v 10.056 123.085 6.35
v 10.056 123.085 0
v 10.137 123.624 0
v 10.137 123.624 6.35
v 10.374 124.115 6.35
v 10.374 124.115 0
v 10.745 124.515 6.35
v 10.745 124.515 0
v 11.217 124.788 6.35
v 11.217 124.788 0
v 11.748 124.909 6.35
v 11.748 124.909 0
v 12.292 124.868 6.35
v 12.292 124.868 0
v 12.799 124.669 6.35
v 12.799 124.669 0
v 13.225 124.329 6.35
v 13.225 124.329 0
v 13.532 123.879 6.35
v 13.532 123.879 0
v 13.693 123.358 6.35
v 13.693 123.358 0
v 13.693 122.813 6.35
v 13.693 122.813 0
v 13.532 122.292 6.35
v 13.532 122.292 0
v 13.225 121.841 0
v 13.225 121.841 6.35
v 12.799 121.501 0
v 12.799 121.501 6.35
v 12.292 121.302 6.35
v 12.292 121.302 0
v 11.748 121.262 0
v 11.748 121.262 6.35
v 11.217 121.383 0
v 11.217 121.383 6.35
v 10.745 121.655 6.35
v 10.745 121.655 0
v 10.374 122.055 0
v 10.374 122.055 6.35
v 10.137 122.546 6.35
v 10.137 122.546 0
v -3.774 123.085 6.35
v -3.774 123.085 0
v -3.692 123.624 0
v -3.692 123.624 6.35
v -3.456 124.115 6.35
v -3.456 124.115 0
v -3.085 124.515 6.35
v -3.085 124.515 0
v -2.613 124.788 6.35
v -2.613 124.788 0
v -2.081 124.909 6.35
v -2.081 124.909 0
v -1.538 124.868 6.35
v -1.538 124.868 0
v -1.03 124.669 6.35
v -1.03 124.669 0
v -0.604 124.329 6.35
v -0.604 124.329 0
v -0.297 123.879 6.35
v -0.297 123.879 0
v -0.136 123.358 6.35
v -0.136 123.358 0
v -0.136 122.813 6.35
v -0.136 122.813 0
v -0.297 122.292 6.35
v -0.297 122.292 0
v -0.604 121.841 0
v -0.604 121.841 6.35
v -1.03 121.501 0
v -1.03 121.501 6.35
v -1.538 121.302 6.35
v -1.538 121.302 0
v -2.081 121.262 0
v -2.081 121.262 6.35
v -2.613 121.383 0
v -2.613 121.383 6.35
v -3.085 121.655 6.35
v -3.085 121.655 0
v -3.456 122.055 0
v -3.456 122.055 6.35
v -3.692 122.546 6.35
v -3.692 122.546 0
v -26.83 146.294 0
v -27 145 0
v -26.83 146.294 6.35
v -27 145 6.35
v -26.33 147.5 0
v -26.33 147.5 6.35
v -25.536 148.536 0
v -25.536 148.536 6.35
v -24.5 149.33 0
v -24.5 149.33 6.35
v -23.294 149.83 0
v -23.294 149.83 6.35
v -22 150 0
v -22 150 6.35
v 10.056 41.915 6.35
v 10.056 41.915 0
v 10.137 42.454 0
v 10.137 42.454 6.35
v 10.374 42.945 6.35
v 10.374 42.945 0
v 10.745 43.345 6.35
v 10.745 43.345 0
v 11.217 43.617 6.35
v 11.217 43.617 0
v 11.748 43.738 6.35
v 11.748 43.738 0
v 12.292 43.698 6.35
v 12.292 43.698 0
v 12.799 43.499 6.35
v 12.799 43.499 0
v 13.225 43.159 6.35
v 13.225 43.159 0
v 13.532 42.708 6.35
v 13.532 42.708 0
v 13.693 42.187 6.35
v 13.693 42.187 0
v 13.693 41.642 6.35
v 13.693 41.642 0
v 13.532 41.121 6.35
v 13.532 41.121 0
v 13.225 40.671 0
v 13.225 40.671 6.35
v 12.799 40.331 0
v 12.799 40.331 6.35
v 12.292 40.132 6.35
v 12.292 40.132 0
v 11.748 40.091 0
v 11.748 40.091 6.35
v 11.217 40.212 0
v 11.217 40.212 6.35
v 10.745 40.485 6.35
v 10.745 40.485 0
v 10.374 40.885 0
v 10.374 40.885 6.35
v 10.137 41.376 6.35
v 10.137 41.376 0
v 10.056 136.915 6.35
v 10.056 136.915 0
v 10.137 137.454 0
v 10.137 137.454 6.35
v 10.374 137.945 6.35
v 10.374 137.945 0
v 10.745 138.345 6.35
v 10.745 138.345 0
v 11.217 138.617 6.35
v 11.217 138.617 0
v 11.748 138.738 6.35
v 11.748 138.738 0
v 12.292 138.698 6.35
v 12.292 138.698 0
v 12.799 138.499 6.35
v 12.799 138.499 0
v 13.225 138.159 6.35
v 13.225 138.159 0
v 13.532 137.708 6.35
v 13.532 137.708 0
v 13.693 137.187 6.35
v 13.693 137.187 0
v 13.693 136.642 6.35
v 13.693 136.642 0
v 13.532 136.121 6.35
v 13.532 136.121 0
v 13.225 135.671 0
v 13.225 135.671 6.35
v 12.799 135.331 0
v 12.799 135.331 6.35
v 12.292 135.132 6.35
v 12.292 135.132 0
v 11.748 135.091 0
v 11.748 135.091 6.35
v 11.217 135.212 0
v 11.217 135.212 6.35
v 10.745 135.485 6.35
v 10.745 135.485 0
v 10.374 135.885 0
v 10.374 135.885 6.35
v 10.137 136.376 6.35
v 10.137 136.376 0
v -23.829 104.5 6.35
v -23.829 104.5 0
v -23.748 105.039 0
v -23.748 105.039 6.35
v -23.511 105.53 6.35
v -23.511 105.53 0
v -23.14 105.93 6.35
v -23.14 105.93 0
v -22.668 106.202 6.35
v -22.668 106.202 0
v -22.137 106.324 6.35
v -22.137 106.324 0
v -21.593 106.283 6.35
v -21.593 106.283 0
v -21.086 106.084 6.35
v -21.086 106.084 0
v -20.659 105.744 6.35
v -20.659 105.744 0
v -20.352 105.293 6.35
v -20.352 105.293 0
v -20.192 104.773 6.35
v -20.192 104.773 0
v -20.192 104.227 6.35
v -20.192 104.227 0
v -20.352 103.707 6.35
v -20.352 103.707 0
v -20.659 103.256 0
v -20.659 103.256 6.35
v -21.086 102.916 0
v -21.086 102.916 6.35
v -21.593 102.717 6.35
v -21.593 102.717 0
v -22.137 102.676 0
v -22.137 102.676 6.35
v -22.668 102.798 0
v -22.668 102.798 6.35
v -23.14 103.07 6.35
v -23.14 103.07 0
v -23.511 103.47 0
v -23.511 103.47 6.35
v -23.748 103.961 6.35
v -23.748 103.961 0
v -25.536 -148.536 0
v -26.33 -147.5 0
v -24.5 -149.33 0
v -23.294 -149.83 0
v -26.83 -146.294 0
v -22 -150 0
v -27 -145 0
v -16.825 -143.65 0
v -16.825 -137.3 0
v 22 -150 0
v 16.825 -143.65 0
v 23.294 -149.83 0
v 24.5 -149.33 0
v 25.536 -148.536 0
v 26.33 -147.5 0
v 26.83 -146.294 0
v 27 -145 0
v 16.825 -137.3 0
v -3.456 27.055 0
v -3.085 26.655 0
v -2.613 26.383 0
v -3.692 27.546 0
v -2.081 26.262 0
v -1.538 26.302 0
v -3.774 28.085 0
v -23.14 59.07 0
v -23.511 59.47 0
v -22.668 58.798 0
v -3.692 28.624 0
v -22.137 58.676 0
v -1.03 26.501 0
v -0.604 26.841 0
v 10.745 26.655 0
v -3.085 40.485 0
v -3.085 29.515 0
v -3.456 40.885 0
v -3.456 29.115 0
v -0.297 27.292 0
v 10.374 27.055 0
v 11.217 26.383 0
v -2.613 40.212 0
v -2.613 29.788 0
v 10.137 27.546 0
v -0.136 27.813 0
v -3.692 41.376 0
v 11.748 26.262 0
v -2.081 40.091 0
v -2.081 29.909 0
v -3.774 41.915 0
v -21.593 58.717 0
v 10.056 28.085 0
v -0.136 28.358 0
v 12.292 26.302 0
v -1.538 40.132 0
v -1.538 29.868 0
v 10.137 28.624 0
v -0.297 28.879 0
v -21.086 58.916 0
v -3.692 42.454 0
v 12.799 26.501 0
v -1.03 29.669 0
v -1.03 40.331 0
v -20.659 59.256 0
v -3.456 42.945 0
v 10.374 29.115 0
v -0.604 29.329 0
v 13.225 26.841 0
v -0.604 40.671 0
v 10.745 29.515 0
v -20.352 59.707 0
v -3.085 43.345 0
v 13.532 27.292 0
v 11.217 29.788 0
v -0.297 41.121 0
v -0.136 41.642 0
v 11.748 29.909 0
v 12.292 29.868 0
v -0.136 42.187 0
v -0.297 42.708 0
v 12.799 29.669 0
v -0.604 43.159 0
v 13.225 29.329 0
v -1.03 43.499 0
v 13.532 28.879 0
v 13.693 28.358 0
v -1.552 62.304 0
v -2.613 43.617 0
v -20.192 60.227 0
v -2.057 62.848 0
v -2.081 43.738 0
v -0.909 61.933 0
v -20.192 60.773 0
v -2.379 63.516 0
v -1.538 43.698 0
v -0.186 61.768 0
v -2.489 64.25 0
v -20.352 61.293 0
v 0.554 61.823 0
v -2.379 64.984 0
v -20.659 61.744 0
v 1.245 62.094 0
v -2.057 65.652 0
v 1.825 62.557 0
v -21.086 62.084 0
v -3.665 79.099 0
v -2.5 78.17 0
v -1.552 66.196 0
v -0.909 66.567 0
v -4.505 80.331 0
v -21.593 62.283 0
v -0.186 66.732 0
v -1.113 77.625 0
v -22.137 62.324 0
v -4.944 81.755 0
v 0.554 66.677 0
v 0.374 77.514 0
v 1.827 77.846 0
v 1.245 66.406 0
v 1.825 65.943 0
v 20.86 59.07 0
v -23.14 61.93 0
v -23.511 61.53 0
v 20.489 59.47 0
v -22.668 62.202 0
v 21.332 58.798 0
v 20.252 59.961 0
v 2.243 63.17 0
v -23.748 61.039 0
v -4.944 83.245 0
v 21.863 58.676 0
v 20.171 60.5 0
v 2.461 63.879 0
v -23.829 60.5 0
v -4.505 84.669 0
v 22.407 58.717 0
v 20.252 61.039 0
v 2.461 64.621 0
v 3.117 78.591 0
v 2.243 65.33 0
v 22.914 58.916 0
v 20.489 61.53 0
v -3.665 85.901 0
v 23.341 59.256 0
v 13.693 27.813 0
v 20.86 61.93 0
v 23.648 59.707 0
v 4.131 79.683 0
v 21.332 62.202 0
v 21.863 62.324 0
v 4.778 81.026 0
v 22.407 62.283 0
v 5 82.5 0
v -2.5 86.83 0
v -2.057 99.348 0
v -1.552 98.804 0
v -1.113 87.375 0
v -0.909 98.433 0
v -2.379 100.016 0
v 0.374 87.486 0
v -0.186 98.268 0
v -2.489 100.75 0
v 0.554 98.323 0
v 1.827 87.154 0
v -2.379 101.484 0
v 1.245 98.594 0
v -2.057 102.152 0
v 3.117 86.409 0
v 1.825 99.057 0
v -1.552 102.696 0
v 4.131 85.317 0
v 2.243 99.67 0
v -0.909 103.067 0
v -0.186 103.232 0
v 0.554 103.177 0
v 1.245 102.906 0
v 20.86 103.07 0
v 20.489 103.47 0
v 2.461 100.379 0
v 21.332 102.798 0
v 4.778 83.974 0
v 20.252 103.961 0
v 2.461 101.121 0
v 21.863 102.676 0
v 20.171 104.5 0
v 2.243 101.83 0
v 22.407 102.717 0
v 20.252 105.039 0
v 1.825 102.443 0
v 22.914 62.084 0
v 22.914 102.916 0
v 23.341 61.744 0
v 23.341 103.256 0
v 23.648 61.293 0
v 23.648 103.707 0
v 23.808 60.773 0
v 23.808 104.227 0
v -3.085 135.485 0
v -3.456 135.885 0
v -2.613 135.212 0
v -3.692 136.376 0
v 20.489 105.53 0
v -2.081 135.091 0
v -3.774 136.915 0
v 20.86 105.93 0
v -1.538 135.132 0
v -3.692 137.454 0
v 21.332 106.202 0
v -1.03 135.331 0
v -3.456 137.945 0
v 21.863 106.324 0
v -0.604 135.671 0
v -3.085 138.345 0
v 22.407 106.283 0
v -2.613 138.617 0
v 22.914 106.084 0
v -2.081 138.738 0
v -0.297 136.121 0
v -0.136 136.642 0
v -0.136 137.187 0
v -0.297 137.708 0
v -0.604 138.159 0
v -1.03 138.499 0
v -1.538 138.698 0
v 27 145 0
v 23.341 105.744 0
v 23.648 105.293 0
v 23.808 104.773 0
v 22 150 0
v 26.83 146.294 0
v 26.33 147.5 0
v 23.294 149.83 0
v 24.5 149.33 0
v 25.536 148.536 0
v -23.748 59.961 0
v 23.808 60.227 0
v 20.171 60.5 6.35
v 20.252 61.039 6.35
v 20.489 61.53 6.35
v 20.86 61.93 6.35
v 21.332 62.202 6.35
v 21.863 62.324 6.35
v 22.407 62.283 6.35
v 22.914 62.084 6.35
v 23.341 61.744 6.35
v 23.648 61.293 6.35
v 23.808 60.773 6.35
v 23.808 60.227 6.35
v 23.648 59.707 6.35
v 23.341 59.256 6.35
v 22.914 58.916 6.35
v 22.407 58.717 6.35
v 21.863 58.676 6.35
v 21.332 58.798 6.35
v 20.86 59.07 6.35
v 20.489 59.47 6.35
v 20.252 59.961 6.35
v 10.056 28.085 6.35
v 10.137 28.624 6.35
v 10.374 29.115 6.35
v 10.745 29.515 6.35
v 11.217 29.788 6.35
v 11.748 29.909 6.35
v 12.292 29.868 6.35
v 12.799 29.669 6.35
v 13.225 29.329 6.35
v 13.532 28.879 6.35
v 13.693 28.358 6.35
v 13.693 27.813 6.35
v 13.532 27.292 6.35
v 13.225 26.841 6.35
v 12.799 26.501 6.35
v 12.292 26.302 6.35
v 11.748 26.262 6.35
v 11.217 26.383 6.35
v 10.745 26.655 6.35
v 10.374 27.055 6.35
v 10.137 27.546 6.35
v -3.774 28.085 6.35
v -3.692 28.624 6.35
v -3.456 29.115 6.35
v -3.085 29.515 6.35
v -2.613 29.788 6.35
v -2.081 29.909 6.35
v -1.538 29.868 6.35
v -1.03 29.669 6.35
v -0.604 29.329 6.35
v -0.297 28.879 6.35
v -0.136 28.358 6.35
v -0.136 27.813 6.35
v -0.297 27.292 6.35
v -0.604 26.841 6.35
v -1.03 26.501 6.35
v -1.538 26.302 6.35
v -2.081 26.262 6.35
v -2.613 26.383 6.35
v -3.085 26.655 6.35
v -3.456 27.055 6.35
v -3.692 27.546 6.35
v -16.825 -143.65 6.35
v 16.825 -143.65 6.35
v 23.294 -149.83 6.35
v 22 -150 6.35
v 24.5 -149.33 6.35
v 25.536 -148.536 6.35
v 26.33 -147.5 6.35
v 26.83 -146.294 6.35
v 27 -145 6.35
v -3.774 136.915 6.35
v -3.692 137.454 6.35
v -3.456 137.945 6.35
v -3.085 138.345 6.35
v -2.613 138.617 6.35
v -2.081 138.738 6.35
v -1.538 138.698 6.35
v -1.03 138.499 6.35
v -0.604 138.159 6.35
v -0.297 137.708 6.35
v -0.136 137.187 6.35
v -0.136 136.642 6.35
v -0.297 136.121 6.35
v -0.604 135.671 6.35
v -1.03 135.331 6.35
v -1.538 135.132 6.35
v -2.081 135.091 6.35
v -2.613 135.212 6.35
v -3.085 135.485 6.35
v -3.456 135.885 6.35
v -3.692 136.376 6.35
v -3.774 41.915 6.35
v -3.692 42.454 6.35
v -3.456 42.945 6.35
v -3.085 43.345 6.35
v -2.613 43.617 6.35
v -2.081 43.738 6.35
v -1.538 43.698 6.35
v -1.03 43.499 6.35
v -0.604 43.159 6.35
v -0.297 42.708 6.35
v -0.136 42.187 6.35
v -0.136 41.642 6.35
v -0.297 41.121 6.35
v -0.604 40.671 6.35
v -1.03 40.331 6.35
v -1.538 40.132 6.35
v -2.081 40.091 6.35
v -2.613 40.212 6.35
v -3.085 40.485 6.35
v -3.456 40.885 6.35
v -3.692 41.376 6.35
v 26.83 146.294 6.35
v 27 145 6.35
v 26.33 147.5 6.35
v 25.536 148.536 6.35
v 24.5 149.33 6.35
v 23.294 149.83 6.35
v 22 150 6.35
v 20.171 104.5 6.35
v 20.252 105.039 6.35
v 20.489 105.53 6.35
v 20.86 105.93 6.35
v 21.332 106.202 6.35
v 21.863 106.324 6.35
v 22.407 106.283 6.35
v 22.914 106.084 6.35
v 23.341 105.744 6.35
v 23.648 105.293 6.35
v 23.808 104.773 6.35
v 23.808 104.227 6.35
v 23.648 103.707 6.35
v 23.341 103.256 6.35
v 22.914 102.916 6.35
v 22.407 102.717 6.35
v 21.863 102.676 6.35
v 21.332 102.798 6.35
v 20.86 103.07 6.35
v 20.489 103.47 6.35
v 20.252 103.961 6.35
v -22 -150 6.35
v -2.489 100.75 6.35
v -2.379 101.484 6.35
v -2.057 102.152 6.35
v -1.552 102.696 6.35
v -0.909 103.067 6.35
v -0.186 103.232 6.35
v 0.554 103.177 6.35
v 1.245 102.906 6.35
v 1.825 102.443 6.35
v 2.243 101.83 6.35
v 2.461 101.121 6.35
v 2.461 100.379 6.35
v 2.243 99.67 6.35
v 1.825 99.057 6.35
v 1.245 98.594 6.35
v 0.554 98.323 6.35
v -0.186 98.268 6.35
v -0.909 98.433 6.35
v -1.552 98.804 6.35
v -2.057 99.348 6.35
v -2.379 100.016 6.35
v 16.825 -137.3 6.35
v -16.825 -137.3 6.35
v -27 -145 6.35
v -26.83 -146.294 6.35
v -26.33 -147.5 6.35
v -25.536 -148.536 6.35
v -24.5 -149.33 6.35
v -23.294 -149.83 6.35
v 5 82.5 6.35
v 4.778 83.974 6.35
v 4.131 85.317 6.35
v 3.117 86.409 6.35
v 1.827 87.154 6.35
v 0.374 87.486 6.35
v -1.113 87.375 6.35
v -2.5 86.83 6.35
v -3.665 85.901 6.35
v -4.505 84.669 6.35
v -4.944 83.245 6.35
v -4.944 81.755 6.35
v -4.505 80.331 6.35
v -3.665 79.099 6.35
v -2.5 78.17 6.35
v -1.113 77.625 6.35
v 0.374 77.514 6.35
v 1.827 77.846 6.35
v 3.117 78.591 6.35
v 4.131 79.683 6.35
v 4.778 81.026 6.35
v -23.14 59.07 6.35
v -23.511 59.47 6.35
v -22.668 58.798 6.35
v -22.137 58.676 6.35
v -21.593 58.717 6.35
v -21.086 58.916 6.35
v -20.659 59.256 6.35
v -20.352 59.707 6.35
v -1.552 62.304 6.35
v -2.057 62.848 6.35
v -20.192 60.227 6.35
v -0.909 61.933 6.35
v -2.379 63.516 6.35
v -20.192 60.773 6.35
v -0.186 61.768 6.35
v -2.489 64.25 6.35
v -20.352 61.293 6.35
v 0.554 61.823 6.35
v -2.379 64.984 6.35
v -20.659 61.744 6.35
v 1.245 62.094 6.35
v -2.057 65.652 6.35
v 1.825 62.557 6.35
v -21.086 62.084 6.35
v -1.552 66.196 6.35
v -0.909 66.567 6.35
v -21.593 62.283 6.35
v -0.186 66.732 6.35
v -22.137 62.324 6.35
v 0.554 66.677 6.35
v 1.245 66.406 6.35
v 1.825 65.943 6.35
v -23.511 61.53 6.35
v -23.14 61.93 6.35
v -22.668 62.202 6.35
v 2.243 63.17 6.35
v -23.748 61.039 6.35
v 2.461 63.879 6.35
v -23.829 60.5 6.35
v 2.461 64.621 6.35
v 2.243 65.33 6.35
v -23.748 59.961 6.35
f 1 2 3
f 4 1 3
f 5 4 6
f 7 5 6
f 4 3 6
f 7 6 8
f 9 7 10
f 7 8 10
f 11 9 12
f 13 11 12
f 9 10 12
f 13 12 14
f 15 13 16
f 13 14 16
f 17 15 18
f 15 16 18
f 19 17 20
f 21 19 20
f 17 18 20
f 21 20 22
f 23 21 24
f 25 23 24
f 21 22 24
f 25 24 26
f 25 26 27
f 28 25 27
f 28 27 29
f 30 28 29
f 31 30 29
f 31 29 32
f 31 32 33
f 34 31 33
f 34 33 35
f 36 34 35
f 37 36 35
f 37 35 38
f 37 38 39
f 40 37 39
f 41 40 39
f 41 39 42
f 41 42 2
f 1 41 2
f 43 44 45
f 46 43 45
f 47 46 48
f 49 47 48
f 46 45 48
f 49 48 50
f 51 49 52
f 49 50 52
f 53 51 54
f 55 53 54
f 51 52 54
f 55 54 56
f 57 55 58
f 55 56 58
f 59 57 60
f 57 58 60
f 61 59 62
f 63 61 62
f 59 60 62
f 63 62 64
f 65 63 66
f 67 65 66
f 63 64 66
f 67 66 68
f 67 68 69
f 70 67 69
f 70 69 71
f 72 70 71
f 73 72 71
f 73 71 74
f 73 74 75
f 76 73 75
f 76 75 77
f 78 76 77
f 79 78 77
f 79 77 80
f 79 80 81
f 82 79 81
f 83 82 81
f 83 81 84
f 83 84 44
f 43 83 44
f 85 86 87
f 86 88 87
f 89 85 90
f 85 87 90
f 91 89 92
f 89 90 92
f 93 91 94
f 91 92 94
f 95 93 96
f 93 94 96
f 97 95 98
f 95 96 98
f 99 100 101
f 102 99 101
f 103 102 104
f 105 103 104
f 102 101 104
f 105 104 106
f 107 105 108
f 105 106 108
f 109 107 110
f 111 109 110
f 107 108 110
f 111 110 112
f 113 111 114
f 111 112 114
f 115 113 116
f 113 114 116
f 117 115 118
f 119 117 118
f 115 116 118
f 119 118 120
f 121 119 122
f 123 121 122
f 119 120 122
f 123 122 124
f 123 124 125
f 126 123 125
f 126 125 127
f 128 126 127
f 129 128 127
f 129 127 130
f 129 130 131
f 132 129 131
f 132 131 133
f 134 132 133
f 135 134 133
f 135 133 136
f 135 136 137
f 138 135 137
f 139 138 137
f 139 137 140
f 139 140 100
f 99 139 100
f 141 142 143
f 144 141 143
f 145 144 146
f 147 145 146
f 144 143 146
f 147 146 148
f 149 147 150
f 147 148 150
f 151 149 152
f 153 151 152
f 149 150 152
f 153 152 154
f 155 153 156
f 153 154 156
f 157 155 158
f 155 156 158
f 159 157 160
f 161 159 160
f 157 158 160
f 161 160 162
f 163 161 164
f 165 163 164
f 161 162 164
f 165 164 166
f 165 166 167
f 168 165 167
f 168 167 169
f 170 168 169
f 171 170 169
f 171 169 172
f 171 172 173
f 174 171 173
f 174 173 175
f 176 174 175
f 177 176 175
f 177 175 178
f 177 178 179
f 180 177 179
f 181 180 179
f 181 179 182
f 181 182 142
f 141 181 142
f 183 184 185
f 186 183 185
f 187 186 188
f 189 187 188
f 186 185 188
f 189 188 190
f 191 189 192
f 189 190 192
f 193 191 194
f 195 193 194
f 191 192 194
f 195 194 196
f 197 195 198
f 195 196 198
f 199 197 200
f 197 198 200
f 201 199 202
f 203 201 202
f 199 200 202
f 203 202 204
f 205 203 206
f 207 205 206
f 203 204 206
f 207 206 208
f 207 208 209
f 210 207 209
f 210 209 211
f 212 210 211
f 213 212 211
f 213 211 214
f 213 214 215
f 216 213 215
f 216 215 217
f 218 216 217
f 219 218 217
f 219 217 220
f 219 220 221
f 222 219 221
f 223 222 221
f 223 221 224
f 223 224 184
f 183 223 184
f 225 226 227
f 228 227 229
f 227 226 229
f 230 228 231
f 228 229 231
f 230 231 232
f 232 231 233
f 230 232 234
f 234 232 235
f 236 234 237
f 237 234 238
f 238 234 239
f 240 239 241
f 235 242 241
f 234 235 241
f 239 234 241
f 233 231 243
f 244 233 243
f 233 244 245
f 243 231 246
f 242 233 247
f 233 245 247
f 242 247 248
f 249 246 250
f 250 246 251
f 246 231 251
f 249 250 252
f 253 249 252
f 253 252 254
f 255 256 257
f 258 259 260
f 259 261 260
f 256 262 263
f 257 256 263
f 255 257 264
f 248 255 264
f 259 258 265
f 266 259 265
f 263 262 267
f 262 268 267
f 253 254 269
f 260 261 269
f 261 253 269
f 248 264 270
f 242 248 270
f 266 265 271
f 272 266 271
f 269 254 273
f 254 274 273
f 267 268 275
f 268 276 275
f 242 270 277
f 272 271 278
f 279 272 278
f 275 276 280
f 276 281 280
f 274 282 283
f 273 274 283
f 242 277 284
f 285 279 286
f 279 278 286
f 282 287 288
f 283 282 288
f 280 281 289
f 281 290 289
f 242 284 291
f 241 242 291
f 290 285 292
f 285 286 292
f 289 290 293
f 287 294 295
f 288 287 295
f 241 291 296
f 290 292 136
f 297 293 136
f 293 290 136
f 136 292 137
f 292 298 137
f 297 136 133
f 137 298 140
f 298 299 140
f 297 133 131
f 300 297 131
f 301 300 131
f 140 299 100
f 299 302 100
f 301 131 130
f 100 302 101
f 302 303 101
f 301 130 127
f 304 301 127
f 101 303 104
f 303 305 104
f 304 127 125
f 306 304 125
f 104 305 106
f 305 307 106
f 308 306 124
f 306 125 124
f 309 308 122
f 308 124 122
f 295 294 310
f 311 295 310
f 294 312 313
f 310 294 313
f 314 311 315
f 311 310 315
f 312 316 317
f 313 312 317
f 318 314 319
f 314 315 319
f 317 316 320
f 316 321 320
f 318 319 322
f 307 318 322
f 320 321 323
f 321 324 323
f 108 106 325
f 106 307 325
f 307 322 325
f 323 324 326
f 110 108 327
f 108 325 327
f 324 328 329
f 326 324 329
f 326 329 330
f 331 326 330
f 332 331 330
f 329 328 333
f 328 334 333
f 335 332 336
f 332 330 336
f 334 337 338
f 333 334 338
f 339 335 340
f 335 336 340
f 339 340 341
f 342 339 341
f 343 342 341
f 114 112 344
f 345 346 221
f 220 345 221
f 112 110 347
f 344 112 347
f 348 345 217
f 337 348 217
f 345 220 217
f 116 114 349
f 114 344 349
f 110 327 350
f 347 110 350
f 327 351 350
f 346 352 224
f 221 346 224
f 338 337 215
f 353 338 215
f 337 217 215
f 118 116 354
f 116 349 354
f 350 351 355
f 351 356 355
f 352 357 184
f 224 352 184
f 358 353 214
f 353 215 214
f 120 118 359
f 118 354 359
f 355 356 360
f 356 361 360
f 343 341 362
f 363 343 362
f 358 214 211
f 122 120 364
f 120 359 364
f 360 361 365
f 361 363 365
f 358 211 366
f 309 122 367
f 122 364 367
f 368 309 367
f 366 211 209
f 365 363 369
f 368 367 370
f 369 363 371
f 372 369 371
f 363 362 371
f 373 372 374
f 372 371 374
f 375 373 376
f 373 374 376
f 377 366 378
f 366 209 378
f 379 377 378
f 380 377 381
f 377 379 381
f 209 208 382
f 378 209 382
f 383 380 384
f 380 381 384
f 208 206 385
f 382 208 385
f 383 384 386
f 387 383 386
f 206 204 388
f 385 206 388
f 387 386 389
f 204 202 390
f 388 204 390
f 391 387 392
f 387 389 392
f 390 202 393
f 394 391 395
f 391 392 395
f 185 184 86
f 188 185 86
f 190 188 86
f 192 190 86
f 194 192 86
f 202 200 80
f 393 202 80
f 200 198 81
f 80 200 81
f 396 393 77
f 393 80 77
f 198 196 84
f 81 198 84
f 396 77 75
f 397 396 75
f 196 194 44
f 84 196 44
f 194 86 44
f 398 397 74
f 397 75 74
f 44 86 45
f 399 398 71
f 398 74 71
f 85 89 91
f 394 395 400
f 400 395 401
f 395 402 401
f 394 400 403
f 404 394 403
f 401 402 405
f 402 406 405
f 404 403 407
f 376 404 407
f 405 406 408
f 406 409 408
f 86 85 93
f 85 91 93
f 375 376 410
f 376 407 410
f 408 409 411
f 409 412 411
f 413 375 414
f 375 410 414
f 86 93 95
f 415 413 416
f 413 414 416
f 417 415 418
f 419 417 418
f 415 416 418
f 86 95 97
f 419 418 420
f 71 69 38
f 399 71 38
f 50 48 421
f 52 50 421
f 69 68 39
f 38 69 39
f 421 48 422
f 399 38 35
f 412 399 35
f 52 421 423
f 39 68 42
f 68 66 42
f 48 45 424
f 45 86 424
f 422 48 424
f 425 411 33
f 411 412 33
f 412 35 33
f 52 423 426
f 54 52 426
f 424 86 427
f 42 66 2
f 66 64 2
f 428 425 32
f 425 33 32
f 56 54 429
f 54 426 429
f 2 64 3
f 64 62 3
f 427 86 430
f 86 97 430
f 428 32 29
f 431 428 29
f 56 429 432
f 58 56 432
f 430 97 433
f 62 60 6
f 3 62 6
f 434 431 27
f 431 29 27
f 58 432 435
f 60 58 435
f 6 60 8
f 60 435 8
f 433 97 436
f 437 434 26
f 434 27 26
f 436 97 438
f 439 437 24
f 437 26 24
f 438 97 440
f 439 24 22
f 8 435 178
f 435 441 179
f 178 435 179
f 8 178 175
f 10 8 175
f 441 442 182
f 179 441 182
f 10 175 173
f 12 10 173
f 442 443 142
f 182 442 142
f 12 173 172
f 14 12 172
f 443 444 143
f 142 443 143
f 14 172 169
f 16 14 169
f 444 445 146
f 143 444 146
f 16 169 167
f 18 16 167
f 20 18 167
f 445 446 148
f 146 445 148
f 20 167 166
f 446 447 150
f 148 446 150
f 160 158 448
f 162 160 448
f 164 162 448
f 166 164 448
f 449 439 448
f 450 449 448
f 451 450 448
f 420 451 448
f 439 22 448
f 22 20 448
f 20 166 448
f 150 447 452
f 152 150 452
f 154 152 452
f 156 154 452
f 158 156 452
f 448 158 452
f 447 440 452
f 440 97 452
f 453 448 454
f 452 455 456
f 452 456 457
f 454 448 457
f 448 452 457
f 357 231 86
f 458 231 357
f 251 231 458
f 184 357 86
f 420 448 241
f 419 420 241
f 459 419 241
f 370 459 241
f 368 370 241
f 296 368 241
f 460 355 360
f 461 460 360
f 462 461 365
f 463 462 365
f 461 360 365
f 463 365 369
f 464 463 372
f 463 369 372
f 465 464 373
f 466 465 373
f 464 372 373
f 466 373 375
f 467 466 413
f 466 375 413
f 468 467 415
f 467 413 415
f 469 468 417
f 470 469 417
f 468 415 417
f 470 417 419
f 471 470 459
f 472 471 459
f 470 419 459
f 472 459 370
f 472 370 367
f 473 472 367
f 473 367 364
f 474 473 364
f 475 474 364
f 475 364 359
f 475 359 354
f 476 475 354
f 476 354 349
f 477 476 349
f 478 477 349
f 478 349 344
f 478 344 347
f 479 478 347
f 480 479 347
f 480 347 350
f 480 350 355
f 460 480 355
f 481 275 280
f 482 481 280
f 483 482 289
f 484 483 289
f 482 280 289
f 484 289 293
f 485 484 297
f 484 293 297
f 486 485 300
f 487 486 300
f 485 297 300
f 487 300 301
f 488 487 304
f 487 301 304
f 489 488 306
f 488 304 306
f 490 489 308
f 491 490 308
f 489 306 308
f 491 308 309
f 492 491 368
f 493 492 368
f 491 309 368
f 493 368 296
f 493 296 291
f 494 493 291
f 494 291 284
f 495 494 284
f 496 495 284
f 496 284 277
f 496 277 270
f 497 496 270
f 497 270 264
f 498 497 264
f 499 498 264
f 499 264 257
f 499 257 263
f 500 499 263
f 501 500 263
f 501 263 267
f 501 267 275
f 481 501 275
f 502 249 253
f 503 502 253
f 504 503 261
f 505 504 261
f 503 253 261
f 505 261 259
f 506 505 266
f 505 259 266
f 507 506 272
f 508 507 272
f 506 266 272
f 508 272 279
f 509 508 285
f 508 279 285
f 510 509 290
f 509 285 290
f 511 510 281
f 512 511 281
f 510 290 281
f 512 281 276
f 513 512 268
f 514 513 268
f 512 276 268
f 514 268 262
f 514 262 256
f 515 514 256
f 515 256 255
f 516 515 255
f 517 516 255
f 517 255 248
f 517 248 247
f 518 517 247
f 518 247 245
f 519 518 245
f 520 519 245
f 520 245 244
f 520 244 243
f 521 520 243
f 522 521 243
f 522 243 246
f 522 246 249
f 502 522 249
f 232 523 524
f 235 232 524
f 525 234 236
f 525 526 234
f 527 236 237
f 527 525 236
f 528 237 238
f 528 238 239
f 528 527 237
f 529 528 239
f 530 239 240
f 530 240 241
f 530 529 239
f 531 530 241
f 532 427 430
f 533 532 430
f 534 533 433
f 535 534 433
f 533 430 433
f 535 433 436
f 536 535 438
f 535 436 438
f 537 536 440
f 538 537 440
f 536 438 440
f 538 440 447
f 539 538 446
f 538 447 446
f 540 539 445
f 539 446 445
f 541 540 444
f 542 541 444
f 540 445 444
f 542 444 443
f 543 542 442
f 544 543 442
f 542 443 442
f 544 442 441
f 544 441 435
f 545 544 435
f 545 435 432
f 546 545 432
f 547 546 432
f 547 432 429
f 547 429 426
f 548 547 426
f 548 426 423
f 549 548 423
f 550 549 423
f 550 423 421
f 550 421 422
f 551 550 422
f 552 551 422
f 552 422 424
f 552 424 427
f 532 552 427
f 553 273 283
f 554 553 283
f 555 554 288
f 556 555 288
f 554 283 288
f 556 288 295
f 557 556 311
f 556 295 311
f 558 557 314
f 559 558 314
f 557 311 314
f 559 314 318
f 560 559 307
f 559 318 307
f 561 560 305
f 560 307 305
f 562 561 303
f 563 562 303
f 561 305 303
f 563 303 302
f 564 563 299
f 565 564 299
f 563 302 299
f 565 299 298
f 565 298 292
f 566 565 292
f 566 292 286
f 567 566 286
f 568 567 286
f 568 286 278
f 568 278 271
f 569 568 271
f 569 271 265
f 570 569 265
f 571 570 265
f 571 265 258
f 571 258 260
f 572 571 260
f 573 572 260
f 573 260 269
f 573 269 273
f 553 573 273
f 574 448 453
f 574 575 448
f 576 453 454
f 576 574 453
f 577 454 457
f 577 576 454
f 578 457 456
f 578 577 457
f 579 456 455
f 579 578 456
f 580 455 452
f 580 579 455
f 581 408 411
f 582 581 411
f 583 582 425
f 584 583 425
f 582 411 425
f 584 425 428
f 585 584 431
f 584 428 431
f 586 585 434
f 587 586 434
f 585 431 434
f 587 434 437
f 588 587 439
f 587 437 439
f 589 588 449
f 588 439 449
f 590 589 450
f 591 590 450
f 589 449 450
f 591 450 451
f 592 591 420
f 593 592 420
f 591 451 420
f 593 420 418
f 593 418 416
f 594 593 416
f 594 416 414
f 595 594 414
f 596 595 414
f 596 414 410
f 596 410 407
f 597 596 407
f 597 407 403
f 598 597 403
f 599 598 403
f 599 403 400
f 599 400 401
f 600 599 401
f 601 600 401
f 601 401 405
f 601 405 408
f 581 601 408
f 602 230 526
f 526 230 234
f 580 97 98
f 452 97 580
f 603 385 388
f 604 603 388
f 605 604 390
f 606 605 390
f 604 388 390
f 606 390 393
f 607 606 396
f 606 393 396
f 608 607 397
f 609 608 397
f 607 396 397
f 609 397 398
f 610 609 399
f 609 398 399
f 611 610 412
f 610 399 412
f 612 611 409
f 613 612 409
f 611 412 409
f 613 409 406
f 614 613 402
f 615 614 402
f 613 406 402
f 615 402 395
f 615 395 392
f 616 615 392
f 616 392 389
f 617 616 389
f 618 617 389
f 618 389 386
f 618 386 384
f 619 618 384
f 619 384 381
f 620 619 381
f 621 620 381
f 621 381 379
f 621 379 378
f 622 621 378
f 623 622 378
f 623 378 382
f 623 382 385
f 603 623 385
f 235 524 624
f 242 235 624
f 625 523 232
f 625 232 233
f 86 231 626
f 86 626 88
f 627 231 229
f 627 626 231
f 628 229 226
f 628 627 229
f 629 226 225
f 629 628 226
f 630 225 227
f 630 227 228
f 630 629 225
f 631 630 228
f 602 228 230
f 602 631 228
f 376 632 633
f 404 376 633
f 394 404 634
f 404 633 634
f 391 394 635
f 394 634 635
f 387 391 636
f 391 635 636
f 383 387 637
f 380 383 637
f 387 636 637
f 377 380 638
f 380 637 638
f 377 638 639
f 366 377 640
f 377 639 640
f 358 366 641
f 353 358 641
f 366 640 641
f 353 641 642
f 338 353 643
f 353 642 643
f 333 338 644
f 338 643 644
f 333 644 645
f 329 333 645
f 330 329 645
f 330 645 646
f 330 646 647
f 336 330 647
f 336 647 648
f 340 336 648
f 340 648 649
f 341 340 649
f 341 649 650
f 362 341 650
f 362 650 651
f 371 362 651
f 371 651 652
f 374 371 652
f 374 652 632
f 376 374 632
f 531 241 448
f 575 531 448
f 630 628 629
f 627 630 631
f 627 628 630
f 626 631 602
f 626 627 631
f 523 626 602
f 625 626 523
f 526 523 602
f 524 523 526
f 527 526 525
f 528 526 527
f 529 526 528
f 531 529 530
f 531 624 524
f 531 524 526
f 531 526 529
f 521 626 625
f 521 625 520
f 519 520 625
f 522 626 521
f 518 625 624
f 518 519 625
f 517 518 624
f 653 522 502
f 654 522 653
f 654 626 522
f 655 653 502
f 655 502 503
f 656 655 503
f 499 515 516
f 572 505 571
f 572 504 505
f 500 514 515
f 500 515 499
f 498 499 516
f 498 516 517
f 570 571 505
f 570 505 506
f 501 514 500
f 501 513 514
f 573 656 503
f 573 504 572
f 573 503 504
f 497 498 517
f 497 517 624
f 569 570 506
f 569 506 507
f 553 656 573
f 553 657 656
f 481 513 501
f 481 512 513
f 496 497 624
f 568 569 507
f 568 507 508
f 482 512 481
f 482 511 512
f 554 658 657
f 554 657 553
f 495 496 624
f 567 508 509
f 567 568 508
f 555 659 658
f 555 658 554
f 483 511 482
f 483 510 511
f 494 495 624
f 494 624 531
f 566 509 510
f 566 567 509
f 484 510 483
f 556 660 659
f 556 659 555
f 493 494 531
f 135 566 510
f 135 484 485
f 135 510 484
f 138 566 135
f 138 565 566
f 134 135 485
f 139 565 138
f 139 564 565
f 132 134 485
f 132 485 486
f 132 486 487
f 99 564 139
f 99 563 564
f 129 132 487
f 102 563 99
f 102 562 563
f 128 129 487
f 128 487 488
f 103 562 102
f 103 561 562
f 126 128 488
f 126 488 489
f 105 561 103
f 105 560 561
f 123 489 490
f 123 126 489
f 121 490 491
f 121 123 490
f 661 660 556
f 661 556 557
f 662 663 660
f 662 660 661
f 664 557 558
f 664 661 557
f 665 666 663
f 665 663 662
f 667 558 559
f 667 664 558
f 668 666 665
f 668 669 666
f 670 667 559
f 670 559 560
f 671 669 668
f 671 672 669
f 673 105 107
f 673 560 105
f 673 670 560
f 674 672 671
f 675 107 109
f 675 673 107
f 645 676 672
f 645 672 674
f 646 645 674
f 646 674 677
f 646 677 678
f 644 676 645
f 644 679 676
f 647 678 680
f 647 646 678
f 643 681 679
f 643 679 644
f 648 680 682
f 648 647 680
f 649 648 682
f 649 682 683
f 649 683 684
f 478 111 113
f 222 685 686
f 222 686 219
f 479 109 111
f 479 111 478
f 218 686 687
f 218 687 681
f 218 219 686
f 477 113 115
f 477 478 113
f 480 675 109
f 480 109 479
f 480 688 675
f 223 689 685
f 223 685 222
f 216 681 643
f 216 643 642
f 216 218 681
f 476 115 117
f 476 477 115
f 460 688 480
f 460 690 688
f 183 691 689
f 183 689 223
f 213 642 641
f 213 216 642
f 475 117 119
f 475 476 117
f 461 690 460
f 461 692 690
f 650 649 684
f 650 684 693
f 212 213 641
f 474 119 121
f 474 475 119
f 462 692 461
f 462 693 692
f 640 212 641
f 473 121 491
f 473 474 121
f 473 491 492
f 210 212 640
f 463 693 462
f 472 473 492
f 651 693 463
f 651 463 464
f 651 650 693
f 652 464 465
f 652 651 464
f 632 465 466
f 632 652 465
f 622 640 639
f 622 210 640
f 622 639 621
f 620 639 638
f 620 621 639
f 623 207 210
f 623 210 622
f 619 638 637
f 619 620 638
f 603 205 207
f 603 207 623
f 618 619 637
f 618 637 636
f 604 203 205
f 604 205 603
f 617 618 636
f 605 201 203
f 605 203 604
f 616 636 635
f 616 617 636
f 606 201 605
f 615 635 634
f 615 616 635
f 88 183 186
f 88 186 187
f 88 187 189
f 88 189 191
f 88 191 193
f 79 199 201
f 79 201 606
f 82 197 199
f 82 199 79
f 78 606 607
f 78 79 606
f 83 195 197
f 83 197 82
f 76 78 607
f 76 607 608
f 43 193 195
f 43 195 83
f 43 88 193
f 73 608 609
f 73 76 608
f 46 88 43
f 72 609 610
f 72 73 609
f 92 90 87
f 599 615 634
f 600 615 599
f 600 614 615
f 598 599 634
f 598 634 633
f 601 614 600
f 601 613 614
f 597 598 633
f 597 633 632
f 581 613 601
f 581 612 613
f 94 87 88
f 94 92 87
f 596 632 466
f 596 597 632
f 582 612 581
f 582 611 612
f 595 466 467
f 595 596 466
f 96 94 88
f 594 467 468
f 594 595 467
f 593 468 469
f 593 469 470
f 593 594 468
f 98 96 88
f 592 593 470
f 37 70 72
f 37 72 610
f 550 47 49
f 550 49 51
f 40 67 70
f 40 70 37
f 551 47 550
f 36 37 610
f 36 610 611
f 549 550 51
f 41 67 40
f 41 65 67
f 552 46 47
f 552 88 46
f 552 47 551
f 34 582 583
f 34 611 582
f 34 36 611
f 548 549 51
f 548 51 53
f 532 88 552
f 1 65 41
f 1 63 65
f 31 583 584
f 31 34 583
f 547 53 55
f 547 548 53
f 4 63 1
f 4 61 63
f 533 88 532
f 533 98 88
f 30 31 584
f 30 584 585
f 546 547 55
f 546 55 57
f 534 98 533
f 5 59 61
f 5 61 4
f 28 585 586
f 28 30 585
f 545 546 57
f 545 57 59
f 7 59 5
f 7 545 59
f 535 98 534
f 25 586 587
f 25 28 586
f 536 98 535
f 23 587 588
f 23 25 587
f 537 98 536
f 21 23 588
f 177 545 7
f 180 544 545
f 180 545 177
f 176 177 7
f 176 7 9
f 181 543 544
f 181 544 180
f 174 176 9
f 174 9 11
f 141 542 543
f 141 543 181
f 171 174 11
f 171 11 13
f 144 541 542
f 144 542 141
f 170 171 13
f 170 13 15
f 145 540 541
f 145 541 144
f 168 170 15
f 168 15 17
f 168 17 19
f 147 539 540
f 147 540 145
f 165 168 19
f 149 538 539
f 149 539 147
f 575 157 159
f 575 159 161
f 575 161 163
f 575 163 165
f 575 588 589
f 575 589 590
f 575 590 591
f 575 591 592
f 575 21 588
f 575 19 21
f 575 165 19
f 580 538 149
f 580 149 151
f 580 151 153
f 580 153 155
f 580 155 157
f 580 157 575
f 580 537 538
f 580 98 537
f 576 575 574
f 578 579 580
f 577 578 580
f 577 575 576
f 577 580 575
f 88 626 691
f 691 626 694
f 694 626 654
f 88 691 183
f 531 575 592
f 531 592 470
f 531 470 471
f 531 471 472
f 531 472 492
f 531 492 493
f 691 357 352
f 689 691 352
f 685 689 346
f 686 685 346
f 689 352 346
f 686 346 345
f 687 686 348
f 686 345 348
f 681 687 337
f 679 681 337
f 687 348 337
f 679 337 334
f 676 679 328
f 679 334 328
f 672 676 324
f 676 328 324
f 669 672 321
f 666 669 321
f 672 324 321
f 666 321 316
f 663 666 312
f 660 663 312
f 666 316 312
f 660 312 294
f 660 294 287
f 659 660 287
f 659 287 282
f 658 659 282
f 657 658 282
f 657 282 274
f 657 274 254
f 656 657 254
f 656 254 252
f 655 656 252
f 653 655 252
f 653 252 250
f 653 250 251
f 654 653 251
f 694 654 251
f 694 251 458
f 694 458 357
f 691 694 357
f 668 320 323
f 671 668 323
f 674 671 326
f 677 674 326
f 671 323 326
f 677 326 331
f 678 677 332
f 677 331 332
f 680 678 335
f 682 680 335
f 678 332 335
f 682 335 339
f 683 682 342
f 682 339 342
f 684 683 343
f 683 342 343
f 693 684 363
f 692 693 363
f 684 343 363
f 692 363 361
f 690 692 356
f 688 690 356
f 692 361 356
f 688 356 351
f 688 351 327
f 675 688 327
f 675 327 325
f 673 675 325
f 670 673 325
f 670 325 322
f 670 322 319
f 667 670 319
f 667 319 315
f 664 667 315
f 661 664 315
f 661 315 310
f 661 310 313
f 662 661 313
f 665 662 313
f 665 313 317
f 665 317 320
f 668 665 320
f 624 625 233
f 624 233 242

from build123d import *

# Parameters (mm, degrees)
SKETCH1_W              = 54
SKETCH1_H              = 300
BOSS_EXTRUDE1_DEPTH    = 6.35
FILLET1_R              = 5
SKETCH3_R              = 5
CUT_EXTRUDE1_DEPTH     = 7.35
F_6_CLEARANCE_HOLE1_D  = 3.6576
SKETCH6_W              = 33.65
SKETCH6_H              = 6.35
CUT_EXTRUDE2_DEPTH     = 7.35
F_10_CLEARANCE_HOLE2_D = 4.9784


with BuildPart() as part:
    # Sketch1 → Boss-Extrude1 (new body)
    with BuildSketch(Plane.XY):
        Rectangle(SKETCH1_W, SKETCH1_H)
    extrude(amount=BOSS_EXTRUDE1_DEPTH)

    # Fillet1
    fillet1_edges = [part.edges().sort_by_distance(p)[0] for p in [
        (-27, -150, 3.175),
        (-27, 150, 3.175),
        (27, 150, 3.175),
        (27, -150, 3.175),
    ]]
    fillet(fillet1_edges, radius=FILLET1_R)

    # Sketch3 → Cut-Extrude1 (cut, through all)
    with BuildSketch(Plane.XY.offset(6.35)):
        with Locations((0, 82.5)):
            Circle(SKETCH3_R)
    extrude(amount=-CUT_EXTRUDE1_DEPTH, mode=Mode.SUBTRACT)

    # #6 Clearance Hole1 (through all)
    with Locations(Plane.XY.offset(6.35)):
        with Locations((-22, 104.5), (-22, 60.5), (22, 60.5), (22, 104.5), (-1.944797213, 123.085202787), (-1.944797213, 136.914797213), (11.884797213, 136.914797213), (11.884797213, 123.085202787), (-1.944797213, 41.914797213), (11.884797213, 41.914797213), (11.884797213, 28.085202787), (-1.944797213, 28.085202787)):
            Hole(F_6_CLEARANCE_HOLE1_D / 2)

    # Sketch6 → Cut-Extrude2 (cut, through all)
    with BuildSketch(Plane.XY.offset(6.35)):
        with Locations((0, -140.475)):
            Rectangle(SKETCH6_W, SKETCH6_H)
    extrude(amount=-CUT_EXTRUDE2_DEPTH, mode=Mode.SUBTRACT)

    # #10 Clearance Hole2 (through all)
    with Locations(Plane.XY.offset(6.35)):
        with Locations((0, 64.25), (0, 100.75)):
            Hole(F_10_CLEARANCE_HOLE2_D / 2)


solid = part.part
